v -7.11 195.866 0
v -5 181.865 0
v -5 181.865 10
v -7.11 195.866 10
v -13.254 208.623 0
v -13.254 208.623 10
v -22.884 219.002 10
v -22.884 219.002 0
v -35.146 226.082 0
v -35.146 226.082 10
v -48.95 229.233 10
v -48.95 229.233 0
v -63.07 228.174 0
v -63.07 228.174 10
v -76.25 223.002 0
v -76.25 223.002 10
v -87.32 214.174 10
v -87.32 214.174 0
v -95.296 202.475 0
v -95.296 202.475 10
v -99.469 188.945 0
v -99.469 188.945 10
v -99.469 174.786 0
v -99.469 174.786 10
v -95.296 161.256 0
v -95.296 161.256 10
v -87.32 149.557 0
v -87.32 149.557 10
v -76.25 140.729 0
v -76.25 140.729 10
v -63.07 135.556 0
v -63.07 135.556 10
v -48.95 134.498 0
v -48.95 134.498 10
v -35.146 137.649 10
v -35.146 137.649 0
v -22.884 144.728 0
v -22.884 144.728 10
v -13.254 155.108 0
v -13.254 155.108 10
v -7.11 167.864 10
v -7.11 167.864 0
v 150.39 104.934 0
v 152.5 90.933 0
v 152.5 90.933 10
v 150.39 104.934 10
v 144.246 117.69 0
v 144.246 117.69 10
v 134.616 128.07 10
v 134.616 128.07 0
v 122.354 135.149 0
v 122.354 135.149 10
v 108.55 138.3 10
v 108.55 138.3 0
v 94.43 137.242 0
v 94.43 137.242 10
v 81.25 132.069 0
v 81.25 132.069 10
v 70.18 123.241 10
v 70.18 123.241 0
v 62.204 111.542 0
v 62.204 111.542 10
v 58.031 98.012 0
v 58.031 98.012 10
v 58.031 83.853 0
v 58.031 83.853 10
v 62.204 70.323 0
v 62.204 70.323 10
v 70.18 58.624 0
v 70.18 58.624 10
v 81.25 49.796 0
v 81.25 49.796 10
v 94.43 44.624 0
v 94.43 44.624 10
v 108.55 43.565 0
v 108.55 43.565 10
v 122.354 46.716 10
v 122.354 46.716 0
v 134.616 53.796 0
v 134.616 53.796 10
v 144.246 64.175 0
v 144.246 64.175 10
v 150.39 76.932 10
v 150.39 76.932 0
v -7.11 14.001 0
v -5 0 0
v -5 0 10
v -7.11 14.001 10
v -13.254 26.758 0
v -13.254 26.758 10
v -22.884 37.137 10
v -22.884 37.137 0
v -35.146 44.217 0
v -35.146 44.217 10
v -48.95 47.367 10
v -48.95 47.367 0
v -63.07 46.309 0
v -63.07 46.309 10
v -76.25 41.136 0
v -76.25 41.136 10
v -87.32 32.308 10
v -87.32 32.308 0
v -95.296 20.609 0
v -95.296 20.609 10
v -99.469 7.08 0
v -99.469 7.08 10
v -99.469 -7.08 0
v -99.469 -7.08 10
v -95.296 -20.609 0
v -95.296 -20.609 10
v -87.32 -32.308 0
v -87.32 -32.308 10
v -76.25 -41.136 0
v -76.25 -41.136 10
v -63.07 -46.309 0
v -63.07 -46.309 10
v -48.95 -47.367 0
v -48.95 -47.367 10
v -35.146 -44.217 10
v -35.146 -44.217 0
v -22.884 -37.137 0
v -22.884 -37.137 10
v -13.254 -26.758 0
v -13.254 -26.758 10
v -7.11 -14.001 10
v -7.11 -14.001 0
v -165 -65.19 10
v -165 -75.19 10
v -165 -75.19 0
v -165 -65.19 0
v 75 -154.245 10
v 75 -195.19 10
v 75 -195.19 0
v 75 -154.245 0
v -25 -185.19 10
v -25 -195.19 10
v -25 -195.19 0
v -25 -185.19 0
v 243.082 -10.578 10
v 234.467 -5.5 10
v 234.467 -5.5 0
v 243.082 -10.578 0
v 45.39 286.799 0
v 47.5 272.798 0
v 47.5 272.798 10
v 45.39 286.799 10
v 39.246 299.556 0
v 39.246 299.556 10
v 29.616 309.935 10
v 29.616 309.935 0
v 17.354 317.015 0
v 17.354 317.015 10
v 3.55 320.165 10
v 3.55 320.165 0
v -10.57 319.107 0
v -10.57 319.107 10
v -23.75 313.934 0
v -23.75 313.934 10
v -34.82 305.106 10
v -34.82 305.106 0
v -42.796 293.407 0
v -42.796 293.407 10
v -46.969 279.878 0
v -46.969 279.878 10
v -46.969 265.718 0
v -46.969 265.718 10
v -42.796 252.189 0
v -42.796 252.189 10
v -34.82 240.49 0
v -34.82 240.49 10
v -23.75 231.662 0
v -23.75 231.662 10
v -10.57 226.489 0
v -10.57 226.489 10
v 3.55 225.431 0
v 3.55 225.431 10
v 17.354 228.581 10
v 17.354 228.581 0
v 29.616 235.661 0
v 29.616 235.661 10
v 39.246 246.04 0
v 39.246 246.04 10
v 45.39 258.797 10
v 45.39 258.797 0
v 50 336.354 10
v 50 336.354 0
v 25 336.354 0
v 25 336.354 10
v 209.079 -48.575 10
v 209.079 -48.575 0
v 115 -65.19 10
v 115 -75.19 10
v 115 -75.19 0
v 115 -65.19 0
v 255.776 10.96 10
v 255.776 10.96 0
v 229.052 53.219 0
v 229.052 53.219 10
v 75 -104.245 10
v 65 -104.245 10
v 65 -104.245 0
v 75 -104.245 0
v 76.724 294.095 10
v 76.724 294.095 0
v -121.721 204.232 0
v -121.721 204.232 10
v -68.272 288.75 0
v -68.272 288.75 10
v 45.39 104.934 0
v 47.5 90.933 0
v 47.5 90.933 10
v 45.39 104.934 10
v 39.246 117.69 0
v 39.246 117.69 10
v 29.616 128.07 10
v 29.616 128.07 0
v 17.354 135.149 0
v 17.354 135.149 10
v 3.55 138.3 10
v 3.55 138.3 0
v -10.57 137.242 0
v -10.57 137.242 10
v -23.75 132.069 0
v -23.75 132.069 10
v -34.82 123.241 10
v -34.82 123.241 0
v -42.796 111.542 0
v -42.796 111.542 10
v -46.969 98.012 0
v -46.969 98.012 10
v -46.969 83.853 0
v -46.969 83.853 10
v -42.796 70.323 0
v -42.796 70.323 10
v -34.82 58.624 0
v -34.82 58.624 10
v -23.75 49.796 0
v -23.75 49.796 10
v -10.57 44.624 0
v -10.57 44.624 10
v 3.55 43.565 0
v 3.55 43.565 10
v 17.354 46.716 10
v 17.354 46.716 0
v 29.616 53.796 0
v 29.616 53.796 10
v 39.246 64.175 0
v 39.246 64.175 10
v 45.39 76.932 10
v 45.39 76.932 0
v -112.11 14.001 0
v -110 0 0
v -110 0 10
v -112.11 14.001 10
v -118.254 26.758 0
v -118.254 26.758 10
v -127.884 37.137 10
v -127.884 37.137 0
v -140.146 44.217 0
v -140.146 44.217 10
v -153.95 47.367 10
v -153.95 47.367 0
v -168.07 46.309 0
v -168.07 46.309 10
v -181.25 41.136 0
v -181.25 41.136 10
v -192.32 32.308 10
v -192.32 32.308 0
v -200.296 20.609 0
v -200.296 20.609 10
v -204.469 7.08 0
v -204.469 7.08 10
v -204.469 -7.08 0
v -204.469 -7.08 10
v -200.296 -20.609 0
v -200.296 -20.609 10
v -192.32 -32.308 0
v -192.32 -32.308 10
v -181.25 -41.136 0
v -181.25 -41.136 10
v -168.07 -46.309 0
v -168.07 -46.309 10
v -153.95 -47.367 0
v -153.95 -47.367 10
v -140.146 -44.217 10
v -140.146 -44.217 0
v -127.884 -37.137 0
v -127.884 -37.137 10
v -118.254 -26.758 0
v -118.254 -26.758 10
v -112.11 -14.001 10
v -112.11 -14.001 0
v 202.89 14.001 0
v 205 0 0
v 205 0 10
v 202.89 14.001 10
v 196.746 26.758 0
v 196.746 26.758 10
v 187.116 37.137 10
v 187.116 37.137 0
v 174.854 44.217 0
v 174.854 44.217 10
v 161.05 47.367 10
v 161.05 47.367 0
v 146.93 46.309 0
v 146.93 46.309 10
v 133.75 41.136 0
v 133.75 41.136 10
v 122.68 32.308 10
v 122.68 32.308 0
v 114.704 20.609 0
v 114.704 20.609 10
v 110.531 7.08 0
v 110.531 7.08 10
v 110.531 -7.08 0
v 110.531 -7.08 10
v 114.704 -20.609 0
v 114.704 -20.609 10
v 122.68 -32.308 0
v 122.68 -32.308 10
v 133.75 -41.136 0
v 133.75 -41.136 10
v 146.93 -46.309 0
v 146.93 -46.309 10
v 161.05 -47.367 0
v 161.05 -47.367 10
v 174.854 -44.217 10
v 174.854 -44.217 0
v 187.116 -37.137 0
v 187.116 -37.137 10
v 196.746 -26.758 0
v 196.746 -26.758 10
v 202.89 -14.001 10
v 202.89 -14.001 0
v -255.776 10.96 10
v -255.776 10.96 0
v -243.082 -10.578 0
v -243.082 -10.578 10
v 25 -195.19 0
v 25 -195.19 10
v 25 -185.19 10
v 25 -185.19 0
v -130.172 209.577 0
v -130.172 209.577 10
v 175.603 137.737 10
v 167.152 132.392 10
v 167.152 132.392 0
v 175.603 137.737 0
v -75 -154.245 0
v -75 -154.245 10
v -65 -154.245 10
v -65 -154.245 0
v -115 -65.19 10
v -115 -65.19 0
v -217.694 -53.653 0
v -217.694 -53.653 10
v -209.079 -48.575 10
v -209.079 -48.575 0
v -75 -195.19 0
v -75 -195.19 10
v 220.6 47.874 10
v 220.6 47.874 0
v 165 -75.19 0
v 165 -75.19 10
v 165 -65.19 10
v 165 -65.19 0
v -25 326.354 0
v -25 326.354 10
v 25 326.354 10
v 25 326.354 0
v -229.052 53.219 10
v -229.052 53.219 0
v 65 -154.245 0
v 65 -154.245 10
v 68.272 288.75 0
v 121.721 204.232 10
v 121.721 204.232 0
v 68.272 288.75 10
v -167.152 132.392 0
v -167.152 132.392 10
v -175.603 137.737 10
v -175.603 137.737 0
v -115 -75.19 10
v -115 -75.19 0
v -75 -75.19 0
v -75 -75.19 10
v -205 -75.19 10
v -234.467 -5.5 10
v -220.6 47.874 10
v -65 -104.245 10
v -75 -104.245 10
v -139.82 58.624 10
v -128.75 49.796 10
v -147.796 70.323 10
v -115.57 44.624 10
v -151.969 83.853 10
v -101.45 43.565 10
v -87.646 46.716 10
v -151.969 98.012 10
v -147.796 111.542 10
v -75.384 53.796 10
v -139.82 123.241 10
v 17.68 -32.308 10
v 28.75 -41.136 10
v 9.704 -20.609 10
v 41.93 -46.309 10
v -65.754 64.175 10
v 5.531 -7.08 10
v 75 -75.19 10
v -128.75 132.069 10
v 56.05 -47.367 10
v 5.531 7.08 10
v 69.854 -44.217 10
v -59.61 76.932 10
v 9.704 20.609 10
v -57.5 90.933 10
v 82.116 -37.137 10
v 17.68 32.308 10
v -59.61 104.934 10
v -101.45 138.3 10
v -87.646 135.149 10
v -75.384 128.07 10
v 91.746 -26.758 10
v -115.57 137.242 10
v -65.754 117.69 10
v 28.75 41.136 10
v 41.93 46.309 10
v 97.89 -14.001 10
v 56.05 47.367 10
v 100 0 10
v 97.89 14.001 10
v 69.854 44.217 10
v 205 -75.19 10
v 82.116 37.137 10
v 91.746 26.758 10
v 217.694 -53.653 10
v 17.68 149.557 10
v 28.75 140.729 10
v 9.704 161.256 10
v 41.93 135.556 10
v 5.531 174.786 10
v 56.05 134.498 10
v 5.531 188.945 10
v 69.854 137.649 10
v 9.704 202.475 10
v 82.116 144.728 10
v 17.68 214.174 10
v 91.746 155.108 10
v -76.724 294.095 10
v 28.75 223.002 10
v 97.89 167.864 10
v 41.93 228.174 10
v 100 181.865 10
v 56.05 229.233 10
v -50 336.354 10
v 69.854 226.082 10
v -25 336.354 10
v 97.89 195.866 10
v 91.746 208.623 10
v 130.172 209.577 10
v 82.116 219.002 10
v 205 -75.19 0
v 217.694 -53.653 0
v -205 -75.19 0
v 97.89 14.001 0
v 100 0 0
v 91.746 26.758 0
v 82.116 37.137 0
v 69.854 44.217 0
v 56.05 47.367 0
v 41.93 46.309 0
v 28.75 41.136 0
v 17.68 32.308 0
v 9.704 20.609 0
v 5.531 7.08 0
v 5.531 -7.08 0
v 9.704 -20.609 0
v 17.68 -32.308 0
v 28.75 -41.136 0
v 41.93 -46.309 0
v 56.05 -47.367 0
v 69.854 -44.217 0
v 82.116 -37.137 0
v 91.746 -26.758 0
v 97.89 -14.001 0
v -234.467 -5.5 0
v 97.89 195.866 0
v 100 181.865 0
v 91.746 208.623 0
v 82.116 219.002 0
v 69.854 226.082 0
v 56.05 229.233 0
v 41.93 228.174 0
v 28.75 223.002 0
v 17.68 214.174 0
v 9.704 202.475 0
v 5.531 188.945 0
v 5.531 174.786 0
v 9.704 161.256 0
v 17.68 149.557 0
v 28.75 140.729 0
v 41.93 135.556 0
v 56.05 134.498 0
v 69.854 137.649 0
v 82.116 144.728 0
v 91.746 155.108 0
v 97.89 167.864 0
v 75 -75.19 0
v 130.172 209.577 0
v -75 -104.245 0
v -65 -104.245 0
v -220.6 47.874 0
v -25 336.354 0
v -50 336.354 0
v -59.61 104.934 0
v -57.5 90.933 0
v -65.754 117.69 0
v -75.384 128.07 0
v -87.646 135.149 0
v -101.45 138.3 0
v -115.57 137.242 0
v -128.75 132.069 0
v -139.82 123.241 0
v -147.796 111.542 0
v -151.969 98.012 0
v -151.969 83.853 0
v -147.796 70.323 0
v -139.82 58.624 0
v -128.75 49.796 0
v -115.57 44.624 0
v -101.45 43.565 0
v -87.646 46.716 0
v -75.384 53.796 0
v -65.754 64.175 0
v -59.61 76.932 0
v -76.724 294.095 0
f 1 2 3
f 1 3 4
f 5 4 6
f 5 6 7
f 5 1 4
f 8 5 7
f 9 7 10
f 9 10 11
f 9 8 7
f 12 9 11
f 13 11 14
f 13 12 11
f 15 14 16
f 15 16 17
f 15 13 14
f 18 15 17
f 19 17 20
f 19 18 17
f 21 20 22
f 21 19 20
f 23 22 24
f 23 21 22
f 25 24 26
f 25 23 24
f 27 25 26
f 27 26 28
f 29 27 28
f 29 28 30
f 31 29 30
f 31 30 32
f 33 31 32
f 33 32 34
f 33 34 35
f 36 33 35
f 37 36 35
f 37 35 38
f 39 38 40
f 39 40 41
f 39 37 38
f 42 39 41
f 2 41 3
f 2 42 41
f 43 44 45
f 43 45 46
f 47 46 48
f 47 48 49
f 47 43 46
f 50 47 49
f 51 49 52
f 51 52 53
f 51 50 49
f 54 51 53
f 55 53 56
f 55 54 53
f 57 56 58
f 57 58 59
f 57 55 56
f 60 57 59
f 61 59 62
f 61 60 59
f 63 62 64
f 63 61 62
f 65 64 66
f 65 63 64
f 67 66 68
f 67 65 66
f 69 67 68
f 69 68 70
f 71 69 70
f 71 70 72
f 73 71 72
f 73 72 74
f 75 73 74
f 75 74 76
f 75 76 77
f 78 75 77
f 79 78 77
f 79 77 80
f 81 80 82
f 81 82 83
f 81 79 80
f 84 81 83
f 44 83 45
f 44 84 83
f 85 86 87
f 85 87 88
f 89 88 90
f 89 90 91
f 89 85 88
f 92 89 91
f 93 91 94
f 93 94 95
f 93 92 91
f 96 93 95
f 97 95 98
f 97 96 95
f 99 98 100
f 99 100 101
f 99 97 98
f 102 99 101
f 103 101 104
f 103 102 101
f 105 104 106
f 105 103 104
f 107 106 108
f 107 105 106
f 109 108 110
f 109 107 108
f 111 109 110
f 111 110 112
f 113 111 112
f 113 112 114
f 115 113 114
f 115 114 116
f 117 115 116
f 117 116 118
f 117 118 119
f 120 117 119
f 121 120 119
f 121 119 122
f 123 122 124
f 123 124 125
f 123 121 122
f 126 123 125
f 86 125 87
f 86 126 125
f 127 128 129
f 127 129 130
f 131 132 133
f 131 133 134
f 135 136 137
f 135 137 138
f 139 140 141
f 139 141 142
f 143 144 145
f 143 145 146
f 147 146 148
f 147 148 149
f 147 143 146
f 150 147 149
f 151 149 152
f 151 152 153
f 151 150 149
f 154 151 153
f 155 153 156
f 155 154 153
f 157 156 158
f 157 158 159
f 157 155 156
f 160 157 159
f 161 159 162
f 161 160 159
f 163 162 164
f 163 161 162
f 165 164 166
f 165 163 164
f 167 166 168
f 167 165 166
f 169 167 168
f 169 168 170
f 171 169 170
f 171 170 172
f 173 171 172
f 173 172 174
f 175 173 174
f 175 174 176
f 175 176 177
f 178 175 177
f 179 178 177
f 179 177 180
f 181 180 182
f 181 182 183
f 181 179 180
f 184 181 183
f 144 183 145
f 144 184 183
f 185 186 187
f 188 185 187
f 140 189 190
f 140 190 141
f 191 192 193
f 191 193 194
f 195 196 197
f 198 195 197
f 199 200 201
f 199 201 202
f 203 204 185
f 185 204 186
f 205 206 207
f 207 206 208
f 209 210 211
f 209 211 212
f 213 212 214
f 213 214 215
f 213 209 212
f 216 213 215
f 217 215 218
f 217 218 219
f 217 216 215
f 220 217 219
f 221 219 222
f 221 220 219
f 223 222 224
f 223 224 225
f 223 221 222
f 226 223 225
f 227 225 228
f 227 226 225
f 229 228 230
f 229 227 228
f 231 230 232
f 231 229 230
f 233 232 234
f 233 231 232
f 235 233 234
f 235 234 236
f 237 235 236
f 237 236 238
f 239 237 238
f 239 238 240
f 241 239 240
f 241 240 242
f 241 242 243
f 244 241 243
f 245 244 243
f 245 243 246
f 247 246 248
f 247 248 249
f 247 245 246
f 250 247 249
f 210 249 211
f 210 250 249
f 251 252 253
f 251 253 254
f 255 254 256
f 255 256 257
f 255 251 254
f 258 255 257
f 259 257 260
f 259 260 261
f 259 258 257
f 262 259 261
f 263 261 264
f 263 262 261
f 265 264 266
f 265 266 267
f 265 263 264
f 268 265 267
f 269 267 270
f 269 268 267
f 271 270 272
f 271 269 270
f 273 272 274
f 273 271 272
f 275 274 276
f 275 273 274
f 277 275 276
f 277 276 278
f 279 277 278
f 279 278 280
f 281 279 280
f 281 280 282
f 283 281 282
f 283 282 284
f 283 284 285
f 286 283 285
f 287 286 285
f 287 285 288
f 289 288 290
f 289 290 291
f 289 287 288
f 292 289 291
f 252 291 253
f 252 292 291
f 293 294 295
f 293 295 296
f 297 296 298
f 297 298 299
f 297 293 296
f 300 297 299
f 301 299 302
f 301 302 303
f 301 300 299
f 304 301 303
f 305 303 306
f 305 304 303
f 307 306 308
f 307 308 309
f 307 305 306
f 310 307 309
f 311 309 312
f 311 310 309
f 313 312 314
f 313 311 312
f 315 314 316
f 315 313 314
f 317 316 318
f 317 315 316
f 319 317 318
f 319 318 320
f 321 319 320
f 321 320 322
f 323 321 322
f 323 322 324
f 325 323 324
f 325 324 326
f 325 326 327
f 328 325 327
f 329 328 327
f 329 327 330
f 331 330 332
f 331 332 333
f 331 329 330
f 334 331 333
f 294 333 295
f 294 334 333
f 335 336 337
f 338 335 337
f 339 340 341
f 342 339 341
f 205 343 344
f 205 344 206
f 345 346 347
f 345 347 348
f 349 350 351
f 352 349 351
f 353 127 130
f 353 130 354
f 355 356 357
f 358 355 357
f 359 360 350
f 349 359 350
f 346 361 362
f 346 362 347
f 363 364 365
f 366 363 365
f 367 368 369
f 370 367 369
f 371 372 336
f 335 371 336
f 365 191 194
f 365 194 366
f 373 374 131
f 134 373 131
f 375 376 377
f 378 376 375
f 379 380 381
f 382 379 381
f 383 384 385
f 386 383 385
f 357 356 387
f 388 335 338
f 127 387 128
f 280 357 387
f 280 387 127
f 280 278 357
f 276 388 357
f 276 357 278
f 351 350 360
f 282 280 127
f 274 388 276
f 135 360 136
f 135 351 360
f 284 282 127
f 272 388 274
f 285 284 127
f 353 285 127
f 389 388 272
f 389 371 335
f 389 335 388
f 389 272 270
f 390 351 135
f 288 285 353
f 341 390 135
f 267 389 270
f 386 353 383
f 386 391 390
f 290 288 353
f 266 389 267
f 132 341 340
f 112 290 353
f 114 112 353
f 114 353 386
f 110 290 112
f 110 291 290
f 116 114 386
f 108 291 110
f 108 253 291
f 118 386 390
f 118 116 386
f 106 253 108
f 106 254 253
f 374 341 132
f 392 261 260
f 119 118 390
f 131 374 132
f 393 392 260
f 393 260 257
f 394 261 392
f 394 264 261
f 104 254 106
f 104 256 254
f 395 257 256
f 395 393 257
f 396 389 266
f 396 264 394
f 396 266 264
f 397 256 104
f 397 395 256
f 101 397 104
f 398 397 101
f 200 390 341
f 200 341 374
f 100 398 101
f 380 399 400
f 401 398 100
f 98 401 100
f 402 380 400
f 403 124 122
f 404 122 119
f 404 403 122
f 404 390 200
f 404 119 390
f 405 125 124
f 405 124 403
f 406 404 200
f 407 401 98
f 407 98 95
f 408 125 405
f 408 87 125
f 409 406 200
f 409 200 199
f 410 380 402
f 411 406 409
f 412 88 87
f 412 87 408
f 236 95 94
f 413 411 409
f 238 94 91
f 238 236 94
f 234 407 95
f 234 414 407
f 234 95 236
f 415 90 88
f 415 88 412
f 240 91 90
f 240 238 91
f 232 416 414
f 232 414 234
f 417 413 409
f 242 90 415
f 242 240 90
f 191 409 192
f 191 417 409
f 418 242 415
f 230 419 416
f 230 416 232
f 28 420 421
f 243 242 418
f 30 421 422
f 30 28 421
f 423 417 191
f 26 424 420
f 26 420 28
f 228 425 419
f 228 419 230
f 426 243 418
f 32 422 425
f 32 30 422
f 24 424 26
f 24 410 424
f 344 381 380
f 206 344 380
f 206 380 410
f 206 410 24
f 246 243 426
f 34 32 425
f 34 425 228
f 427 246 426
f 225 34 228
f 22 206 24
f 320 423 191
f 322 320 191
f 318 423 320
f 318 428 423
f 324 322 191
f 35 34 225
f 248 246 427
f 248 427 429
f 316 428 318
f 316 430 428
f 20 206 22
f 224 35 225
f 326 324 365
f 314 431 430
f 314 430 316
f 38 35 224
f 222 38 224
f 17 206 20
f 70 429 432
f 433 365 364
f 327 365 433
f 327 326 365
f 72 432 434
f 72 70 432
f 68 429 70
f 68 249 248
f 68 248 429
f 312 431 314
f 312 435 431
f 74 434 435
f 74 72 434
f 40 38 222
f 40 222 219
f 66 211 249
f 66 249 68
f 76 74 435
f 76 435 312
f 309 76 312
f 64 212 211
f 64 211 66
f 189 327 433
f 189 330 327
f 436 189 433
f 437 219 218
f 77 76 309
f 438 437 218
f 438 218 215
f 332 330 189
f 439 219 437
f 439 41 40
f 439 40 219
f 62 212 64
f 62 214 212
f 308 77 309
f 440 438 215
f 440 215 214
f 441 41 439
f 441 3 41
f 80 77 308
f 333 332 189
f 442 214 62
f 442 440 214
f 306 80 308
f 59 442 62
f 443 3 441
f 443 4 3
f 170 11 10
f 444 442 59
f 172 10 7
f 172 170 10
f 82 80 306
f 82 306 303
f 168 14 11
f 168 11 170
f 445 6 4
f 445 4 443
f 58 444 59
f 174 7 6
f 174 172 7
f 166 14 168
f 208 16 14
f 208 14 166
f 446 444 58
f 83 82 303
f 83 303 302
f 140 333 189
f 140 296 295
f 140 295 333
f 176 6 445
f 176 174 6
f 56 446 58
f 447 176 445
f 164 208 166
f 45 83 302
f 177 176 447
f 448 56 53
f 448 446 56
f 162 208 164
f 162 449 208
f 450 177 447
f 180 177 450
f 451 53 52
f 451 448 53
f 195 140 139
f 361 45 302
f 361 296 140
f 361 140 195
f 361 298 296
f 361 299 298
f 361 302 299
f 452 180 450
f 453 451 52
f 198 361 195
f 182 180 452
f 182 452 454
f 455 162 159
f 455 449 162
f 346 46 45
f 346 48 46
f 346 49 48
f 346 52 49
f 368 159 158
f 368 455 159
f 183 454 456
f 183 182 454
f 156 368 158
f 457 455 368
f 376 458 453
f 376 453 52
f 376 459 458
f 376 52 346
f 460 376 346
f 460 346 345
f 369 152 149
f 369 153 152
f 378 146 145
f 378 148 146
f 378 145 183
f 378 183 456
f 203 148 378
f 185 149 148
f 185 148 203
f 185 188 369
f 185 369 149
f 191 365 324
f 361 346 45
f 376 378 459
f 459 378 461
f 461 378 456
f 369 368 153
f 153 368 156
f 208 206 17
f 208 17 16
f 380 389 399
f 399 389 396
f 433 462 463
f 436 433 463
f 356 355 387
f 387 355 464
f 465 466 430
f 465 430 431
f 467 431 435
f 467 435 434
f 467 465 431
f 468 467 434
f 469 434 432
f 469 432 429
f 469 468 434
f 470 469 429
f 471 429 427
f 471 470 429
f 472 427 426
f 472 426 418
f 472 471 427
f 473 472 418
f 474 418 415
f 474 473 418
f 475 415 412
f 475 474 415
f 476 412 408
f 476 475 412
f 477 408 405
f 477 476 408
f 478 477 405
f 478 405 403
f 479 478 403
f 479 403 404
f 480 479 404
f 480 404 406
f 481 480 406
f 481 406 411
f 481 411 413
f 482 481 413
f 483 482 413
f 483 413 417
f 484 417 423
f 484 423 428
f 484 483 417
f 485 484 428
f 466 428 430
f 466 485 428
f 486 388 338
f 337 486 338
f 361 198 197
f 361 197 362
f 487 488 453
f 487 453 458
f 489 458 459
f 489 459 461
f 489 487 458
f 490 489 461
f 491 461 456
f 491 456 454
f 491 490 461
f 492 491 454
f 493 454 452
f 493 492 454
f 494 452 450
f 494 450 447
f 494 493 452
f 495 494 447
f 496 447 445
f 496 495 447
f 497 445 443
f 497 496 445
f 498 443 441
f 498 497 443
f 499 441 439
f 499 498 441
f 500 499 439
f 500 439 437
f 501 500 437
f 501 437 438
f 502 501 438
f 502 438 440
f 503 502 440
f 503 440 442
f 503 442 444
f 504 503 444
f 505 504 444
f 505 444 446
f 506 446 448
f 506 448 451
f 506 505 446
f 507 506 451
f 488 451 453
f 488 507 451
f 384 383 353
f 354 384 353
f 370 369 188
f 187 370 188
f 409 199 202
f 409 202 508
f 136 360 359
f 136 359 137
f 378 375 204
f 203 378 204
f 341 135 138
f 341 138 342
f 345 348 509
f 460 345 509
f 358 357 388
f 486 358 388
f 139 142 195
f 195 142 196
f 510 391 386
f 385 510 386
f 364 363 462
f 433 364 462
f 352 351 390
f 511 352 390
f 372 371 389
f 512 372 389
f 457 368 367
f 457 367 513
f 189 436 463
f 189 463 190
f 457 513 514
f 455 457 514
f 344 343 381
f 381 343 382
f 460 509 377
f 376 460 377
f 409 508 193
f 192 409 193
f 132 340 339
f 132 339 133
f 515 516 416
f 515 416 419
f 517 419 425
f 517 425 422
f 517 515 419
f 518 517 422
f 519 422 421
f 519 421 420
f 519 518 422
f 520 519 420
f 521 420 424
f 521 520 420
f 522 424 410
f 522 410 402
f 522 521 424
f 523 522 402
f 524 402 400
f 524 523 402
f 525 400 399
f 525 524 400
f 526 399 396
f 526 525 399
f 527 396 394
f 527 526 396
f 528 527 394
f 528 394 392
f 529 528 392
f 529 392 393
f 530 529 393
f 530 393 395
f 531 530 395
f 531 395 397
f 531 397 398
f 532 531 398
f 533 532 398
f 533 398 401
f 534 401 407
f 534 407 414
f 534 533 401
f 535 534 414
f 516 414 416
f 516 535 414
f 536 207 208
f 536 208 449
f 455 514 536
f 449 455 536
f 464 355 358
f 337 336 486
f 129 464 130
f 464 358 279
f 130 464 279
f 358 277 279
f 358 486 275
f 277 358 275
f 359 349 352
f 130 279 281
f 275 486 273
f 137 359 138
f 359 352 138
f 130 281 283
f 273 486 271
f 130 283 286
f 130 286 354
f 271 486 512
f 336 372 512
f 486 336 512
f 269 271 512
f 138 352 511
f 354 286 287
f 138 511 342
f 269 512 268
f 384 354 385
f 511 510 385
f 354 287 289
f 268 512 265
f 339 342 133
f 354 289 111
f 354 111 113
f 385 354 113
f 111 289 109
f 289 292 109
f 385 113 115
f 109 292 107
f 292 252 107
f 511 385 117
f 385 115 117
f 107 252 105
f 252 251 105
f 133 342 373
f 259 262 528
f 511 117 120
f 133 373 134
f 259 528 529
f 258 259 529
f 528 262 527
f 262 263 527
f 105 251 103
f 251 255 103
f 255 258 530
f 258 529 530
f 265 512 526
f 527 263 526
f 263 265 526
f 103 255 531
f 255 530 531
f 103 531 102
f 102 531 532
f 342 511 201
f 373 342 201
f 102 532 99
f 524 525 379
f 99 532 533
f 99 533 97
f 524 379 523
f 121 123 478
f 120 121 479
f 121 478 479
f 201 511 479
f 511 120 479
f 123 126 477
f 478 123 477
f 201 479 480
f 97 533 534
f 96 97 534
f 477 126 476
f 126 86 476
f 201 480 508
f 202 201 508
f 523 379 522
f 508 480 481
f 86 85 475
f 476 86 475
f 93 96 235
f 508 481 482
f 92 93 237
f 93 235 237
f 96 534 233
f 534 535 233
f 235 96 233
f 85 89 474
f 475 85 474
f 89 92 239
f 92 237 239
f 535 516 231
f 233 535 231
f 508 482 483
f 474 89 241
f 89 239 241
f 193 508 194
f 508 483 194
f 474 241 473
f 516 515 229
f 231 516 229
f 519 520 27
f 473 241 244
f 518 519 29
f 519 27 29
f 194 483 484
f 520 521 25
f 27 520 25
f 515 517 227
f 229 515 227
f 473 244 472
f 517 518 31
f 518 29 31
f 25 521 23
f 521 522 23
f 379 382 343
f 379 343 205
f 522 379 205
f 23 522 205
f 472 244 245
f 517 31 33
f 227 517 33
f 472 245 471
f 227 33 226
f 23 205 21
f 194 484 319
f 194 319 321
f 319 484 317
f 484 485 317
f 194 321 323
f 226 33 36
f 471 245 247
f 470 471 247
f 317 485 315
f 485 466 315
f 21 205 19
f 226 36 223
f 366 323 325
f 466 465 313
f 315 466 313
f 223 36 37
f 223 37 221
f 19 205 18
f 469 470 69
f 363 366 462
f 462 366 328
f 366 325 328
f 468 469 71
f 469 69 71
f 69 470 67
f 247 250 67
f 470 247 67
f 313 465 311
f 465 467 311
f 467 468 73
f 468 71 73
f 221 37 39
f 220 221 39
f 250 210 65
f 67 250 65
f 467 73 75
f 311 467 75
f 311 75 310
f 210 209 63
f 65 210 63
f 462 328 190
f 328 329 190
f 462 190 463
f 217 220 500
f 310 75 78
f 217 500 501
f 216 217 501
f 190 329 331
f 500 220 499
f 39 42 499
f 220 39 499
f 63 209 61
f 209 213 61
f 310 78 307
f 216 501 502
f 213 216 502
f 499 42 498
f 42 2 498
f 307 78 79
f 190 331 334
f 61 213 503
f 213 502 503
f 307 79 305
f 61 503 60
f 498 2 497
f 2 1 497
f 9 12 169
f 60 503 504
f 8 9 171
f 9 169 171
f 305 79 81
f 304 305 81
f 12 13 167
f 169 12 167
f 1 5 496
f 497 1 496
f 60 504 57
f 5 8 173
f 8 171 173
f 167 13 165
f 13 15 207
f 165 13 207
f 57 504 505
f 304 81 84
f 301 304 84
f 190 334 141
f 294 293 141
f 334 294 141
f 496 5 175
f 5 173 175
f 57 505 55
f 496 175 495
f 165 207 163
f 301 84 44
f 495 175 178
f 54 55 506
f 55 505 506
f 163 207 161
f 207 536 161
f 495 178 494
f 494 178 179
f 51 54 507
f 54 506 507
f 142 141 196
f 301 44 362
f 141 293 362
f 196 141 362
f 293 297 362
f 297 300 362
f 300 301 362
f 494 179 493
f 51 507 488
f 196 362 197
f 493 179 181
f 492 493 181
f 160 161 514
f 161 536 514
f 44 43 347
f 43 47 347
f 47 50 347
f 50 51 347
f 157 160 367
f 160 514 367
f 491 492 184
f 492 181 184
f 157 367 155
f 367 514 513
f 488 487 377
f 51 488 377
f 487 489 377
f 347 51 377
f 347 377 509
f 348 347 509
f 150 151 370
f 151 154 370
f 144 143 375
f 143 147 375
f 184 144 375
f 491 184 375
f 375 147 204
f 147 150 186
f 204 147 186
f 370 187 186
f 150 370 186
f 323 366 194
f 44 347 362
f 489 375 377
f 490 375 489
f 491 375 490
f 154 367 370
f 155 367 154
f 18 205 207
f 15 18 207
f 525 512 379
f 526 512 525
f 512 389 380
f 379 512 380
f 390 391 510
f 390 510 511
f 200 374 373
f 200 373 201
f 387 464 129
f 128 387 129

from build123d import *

# Parameters (mm, degrees)
ESQUISSE1_R             = 47.5
BOSS_EXTRU_1_DEPTH      = 10
ESQUISSE9_W             = 150
ESQUISSE9_H             = 120
BOSS_EXTRU_2_DEPTH      = 10
ESQUISSE10_W            = 10
ESQUISSE10_H            = 50
ESQUISSE10_W_2          = 50
ESQUISSE10_H_2          = 10
ENL_V_MAT_EXTRU_1_DEPTH = 10


with BuildPart() as part:
    # Esquisse1 → Boss.-Extru.1 (new body)
    with BuildSketch(Plane.XY):
        Polygon((-255.775862069, 10.959681362), (-205, -75.190256718), (205, -75.190256718), (255.775862069, 10.959681362), (50, 336.353741833), (-50, 336.353741833), align=None)
        with Locations((-157.5, 0)):
            Circle(ESQUISSE1_R, mode=Mode.SUBTRACT)
        with Locations((-52.5, 0)):
            Circle(ESQUISSE1_R, mode=Mode.SUBTRACT)
        with Locations((52.5, 0)):
            Circle(ESQUISSE1_R, mode=Mode.SUBTRACT)
        with Locations((157.5, 0)):
            Circle(ESQUISSE1_R, mode=Mode.SUBTRACT)
        with Locations((-105, 90.932667397)):
            Circle(ESQUISSE1_R, mode=Mode.SUBTRACT)
        with Locations((0, 90.932667397)):
            Circle(ESQUISSE1_R, mode=Mode.SUBTRACT)
        with Locations((105, 90.932667397)):
            Circle(ESQUISSE1_R, mode=Mode.SUBTRACT)
        with Locations((-52.5, 181.865334795)):
            Circle(ESQUISSE1_R, mode=Mode.SUBTRACT)
        with Locations((52.5, 181.865334795)):
            Circle(ESQUISSE1_R, mode=Mode.SUBTRACT)
        with Locations((0, 272.798002192)):
            Circle(ESQUISSE1_R, mode=Mode.SUBTRACT)
    extrude(amount=BOSS_EXTRU_1_DEPTH)

    # Esquisse9 → Boss.-Extru.2 (add)
    with BuildSketch(Plane.XY.offset(10)):
        with Locations((0, -135.190256718)):
            Rectangle(ESQUISSE9_W, ESQUISSE9_H)
    extrude(amount=-BOSS_EXTRU_2_DEPTH)

    # Esquisse10 → Enlèv. mat.-Extru.1 (cut)
    with BuildSketch(Plane.XY.offset(10)):
        with Locations((-70, -129.244737692)):
            Rectangle(ESQUISSE10_W, ESQUISSE10_H)
        with Locations((0, -190.190256718)):
            Rectangle(ESQUISSE10_W_2, ESQUISSE10_H_2)
        with Locations((-140, -70.190256718)):
            Rectangle(ESQUISSE10_W_2, ESQUISSE10_H_2)
        Polygon((-217.693965517, -53.652772198), (-209.078971709, -48.575185991), (-234.466902744, -5.500216951), (-243.081896552, -10.577803158), align=None)
        Polygon((-229.051724138, 53.218650255), (-220.599930359, 47.873822668), (-167.151654497, 132.391760453), (-175.603448276, 137.736588039), align=None)
        Polygon((-130.172413793, 209.576835156), (-121.720620015, 204.23200757), (-68.272344153, 288.749945355), (-76.724137931, 294.094772941), align=None)
        with Locations((0, 331.353741833)):
            Rectangle(ESQUISSE10_W_2, ESQUISSE10_H_2)
        Polygon((68.272344153, 288.749945355), (76.724137931, 294.094772941), (130.172413793, 209.576835156), (121.720620015, 204.23200757), align=None)
        Polygon((167.151654497, 132.391760453), (175.603448276, 137.736588039), (229.051724138, 53.218650255), (220.599930359, 47.873822668), align=None)
        Polygon((234.466902744, -5.500216951), (243.081896552, -10.577803158), (217.693965517, -53.652772198), (209.078971709, -48.575185991), align=None)
        with Locations((140, -70.190256718)):
            Rectangle(ESQUISSE10_W_2, ESQUISSE10_H_2)
        with Locations((70, -129.244737692)):
            Rectangle(ESQUISSE10_W, ESQUISSE10_H)
    extrude(amount=-ENL_V_MAT_EXTRU_1_DEPTH, mode=Mode.SUBTRACT)


solid = part.part
